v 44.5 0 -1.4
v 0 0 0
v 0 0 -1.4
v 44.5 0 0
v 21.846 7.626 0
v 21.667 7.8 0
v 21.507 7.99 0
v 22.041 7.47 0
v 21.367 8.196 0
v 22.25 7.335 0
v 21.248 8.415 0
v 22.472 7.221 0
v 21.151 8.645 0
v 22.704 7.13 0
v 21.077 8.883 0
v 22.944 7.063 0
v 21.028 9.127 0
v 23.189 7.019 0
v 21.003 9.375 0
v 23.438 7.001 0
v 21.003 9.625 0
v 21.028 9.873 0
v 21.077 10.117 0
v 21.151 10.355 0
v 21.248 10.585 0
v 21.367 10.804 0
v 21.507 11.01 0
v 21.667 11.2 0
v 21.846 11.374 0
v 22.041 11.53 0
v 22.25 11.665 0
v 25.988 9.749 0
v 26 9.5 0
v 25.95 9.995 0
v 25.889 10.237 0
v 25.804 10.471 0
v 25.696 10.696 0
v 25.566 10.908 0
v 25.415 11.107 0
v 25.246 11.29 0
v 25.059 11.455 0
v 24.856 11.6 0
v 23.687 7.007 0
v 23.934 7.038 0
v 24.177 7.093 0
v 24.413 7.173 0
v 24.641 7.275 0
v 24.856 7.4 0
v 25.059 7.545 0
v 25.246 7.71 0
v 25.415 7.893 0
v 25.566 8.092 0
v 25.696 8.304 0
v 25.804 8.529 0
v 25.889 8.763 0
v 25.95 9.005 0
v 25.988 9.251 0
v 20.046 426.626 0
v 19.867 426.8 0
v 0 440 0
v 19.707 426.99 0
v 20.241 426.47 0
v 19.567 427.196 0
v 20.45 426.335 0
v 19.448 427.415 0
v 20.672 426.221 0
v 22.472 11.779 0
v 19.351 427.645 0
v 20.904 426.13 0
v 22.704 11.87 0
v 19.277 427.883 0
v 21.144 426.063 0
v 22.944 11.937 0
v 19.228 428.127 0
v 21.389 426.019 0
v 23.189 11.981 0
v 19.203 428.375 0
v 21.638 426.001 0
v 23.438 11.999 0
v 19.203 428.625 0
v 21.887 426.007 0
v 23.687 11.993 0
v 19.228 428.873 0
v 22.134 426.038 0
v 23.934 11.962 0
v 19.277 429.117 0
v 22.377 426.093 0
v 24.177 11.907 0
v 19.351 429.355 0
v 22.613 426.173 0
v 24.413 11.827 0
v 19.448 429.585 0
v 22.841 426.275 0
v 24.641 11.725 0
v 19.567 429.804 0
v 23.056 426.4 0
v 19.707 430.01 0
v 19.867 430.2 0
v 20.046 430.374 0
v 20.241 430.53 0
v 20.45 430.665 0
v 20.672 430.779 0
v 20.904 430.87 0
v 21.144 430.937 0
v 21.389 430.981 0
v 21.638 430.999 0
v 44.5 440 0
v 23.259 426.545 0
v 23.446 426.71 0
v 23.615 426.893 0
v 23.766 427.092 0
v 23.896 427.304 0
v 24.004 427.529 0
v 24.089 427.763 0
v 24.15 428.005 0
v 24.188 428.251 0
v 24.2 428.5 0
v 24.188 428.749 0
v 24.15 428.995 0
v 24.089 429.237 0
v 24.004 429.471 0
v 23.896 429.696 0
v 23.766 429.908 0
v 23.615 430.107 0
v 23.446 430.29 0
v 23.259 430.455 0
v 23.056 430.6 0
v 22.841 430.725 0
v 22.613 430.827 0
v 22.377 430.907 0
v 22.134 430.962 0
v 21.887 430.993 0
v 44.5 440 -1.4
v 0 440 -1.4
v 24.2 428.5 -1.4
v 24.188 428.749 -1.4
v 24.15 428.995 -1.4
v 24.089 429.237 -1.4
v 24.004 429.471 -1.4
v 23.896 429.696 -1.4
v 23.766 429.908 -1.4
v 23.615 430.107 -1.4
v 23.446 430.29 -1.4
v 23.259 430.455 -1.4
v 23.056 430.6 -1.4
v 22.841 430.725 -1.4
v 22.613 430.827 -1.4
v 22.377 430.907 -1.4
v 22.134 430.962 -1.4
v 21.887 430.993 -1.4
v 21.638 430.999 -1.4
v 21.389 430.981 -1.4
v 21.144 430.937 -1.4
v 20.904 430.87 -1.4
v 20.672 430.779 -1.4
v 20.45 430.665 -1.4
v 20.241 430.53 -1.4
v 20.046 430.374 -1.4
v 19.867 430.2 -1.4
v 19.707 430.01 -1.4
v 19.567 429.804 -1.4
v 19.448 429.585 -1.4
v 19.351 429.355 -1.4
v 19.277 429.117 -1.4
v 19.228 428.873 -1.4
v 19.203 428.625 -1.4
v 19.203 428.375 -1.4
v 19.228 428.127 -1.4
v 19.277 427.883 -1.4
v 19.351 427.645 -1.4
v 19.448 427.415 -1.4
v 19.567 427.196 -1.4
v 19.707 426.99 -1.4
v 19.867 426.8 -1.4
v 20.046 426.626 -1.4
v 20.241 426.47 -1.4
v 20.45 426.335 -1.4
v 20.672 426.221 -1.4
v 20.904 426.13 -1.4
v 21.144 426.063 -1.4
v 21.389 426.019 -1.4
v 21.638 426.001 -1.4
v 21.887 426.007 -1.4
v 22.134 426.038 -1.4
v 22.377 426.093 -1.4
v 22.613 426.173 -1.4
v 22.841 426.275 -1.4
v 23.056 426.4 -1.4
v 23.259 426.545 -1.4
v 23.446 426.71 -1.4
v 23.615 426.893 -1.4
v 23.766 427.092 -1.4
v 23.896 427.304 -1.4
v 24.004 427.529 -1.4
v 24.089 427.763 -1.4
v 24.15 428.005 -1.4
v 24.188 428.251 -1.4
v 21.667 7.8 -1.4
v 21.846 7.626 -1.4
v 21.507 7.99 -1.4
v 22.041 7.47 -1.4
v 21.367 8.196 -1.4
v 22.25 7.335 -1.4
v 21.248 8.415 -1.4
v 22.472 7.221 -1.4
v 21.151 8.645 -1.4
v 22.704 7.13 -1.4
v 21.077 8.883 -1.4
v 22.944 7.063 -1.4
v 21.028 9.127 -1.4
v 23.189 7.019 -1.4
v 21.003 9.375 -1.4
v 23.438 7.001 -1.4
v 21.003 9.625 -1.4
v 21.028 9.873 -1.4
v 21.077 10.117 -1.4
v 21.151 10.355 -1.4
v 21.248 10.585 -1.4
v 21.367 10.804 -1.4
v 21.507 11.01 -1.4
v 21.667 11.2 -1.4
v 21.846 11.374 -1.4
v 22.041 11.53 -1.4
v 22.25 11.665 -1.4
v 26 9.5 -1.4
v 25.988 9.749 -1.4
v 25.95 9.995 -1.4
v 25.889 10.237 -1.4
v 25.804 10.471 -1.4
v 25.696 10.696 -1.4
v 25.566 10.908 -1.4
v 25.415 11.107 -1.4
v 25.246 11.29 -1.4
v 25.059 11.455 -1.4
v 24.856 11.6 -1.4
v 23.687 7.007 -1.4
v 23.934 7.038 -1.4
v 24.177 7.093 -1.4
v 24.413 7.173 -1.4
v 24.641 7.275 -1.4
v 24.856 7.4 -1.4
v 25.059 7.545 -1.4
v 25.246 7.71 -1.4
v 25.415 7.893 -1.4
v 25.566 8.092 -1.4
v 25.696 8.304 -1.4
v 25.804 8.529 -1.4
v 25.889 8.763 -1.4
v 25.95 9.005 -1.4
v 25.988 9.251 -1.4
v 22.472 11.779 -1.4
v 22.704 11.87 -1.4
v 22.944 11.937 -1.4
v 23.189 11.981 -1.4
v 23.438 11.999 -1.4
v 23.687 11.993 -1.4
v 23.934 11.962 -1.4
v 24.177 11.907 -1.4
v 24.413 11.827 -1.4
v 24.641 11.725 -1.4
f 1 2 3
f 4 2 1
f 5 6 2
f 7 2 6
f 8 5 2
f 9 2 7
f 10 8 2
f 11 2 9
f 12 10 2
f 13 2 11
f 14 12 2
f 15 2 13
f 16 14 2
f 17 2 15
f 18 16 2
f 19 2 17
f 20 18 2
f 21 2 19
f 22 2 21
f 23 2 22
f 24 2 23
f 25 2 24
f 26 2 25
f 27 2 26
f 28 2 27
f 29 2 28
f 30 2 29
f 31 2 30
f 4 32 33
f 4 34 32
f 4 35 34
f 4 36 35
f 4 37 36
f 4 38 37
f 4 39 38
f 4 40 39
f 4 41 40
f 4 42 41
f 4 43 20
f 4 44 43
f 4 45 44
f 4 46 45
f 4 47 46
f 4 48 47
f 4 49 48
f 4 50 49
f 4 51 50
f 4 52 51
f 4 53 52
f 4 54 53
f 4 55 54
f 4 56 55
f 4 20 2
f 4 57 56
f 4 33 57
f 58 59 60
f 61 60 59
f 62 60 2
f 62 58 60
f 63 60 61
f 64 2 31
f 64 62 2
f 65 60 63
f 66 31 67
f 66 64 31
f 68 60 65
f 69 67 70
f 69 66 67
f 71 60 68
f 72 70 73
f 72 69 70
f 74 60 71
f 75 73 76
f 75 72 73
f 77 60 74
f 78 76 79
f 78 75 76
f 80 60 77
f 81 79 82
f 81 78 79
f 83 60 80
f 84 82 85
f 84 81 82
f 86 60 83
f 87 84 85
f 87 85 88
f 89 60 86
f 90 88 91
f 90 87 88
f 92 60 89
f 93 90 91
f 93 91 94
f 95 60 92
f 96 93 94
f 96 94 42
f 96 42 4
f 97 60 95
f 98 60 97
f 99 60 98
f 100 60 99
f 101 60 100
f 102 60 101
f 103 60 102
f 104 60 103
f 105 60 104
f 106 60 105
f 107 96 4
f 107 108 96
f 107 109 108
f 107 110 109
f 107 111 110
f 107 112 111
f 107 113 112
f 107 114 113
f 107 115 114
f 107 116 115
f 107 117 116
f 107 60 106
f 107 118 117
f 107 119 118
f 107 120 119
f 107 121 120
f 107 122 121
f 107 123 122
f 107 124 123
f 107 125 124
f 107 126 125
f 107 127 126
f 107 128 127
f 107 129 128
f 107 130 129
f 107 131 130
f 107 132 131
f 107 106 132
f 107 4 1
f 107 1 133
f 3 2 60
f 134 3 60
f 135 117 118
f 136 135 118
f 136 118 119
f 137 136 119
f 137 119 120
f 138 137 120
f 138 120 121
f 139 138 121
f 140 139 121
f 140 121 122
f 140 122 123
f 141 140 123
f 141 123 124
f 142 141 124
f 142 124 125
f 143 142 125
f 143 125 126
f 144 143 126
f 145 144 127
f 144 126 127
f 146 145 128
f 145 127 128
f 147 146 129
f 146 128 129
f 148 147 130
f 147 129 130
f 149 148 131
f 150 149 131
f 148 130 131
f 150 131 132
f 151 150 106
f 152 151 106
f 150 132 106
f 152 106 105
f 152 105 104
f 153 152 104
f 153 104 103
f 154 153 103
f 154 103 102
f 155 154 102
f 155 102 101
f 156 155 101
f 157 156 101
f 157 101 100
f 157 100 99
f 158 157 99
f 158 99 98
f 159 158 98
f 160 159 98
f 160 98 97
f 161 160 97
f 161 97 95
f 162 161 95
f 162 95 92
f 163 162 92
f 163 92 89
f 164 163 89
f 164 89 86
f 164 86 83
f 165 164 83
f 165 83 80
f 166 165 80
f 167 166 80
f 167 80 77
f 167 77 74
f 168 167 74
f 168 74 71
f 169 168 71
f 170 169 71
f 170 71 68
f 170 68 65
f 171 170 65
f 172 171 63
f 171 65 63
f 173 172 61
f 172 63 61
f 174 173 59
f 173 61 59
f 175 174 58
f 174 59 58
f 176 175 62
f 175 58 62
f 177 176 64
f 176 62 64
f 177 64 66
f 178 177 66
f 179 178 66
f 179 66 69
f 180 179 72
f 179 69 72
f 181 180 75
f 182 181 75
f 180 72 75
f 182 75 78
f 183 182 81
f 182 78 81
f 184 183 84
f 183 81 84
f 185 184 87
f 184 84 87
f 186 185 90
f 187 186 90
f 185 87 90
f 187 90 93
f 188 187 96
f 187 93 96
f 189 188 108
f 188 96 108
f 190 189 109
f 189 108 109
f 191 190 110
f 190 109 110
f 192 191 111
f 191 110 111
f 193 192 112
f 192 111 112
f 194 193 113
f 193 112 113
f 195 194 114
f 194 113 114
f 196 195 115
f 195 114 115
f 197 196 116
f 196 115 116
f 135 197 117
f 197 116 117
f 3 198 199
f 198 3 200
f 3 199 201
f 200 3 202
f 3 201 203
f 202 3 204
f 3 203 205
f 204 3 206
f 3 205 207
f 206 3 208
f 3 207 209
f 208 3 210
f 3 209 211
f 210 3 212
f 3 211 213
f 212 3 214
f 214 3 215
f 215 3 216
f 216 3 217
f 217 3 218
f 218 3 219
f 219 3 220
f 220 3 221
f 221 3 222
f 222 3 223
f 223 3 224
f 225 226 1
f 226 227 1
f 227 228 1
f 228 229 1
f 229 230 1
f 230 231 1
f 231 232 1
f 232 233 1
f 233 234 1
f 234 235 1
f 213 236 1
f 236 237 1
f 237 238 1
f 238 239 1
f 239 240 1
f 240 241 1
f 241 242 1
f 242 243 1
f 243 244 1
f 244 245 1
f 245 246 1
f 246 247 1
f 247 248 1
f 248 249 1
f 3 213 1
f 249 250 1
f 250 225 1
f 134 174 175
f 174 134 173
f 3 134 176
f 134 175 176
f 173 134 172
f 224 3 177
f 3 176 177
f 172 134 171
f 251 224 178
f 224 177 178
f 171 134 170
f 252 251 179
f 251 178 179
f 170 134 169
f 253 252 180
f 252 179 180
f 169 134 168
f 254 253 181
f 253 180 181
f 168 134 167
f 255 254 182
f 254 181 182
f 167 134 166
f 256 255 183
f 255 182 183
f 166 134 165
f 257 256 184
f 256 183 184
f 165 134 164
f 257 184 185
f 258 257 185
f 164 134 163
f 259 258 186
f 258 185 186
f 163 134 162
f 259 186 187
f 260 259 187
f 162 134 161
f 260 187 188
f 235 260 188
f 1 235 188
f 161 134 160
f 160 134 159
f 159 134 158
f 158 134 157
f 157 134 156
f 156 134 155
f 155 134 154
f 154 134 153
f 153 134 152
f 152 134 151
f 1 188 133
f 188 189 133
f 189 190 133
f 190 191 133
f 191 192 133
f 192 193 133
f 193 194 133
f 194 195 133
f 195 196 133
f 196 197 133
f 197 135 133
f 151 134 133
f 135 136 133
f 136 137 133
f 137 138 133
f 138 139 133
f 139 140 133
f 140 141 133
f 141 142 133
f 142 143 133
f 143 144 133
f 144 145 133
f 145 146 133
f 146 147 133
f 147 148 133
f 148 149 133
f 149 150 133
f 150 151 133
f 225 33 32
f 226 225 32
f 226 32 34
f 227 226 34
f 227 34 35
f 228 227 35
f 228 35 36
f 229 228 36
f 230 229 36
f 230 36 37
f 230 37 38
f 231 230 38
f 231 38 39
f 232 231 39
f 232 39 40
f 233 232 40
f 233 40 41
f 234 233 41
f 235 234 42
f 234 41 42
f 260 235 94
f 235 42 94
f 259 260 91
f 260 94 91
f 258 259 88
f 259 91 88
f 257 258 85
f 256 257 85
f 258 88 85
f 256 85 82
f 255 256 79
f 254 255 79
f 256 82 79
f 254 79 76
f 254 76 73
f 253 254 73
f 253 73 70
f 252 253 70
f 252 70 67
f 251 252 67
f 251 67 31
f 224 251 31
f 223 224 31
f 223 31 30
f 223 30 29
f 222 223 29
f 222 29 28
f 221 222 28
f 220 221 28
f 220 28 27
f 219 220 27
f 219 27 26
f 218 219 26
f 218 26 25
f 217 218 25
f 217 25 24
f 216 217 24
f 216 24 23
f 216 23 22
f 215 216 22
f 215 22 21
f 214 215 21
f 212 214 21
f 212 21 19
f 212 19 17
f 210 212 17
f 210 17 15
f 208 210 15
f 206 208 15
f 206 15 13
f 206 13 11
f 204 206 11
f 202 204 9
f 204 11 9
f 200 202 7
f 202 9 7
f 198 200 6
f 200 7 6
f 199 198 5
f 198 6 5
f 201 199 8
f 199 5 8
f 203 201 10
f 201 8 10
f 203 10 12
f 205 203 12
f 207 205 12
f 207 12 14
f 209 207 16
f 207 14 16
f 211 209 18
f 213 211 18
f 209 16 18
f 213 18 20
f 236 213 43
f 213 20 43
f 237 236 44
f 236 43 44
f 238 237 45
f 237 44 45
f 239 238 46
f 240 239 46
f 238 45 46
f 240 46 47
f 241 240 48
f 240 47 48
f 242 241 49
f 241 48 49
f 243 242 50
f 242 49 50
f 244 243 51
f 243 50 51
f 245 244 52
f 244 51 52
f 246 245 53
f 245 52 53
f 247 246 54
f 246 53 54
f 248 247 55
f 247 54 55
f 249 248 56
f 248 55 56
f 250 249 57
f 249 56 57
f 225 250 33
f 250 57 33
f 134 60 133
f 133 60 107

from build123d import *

# Parameters (mm, degrees)
SKETCH1_W          = 44.5
SKETCH1_H          = 440
BASE_FLANGE1_DEPTH = 1.4
CUT_EXTRUDE1_REACH = 444.247
SKETCH6_R          = 2.5


# Sheet-metal steps are written as plain solids
with BuildPart() as part:
    # Sketch1 → Base-Flange1 (new body)
    with BuildSketch(Plane.XY):
        with Locations((22.25, 220)):
            Rectangle(SKETCH1_W, SKETCH1_H)
    extrude(amount=-BASE_FLANGE1_DEPTH)

    # Sketch6 → Cut-Extrude1 (cut, up to next)
    with BuildSketch(Plane.XY, mode=Mode.PRIVATE) as cut_extrude1_sk1:
        with Locations((21.7, 428.5)):
            Circle(SKETCH6_R)
    cut_extrude1_tool1 = extrude(cut_extrude1_sk1.sketch, amount=-CUT_EXTRUDE1_REACH, mode=Mode.PRIVATE) & part.part
    # Sketch6 → Cut-Extrude1 (cut, up to next)
    with BuildSketch(Plane.XY, mode=Mode.PRIVATE) as cut_extrude1_sk2:
        with Locations((23.5, 9.5)):
            Circle(SKETCH6_R)
    cut_extrude1_tool2 = extrude(cut_extrude1_sk2.sketch, amount=-CUT_EXTRUDE1_REACH, mode=Mode.PRIVATE) & part.part
    add(cut_extrude1_tool1.solids().sort_by_distance((21.7, 428.5, 0))[0], mode=Mode.SUBTRACT)
    add(cut_extrude1_tool2.solids().sort_by_distance((23.5, 9.5, 0))[0], mode=Mode.SUBTRACT)


solid = part.part
